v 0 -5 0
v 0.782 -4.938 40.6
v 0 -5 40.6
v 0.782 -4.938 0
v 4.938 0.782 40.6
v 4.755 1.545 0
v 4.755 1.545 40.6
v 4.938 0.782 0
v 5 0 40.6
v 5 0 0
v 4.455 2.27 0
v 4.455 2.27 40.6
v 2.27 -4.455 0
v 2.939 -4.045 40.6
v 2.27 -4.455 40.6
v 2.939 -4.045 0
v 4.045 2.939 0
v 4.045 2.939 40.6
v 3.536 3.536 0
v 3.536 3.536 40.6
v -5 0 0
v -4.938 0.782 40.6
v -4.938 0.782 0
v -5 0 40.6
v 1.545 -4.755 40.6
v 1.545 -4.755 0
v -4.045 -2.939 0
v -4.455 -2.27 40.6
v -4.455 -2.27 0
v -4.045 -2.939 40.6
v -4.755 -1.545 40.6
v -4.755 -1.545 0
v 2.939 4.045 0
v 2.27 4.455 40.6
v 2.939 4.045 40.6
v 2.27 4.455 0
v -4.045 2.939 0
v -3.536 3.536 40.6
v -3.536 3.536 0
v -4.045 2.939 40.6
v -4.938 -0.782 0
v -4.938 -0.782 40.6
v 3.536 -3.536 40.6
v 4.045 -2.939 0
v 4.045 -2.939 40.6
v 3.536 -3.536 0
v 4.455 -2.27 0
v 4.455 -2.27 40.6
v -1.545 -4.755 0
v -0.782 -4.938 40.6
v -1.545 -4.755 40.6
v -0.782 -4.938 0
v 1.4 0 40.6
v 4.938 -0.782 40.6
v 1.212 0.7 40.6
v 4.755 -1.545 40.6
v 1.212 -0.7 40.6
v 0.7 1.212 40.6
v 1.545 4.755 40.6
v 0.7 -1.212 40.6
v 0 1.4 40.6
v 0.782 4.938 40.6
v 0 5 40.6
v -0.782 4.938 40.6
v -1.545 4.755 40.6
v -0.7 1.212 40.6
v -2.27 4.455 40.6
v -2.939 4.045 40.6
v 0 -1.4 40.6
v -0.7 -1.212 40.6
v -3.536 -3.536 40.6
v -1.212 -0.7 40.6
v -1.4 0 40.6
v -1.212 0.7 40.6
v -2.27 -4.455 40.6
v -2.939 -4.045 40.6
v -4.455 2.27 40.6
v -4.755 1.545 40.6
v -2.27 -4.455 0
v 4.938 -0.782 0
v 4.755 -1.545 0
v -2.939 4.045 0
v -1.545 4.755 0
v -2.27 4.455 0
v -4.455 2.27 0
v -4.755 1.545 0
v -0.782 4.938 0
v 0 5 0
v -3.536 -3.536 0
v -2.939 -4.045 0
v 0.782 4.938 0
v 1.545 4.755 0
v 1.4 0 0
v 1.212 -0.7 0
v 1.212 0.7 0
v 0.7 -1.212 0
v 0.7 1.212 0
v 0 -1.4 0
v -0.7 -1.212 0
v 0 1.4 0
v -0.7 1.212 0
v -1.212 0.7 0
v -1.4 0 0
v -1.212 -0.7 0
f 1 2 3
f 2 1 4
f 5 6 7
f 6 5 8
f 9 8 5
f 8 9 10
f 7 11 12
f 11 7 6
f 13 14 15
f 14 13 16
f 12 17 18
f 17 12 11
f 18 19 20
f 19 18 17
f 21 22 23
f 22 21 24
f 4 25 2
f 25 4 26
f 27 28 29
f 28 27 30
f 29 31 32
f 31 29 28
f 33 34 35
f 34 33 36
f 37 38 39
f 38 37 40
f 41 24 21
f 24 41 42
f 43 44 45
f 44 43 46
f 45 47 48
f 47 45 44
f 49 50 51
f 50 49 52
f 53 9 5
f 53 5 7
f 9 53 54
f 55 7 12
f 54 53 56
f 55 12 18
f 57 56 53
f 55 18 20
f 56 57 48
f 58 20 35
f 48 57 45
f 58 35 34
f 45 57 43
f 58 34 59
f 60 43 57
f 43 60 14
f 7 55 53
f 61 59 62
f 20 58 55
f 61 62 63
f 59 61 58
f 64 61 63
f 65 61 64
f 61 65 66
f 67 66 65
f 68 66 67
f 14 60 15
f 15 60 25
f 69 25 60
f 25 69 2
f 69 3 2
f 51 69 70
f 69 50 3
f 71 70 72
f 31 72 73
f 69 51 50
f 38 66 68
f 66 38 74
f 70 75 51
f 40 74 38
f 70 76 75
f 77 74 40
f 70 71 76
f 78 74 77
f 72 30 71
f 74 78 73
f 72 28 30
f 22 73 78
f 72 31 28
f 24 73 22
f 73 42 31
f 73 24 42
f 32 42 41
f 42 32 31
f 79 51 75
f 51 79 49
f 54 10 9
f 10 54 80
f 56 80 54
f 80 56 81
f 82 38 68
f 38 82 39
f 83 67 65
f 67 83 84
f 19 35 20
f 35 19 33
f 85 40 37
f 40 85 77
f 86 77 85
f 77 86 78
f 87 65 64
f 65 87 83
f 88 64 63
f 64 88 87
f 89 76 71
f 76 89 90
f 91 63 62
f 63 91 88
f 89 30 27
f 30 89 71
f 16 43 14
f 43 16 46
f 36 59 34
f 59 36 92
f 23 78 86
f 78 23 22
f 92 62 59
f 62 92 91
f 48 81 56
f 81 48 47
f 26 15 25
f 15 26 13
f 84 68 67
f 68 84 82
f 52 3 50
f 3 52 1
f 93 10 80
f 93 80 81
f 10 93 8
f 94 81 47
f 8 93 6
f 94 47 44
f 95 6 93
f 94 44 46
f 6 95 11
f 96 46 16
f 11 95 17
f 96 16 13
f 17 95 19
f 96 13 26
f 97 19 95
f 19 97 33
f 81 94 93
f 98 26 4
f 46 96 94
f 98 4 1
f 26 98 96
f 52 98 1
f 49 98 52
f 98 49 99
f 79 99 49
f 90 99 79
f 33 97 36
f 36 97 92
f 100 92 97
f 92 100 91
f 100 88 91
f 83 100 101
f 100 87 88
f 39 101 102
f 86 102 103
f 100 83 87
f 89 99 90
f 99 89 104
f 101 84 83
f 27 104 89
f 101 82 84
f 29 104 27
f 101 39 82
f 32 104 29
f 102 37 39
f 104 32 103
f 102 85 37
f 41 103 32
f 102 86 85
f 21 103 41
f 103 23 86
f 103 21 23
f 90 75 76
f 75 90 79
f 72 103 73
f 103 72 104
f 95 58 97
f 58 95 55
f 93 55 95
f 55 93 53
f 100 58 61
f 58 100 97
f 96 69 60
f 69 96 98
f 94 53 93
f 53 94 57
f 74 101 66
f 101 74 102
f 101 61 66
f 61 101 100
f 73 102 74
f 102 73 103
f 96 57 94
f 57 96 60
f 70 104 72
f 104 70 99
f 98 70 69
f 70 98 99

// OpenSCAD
module mock_battery_AAA() {
    cylinder(d=10.2,h=42.5,$fn=40);
    cylinder(d=3.7,h=1.6+42.5,$fn=20);
}

module mock_screw_m3() {
    cylinder(d=3,h=10,$fn=20);
    cylinder(d=6,h=2.4,$fn=20);
}

module battery_AAA() {
    difference() {
        cylinder(d=10,h=42.5+1.6-3.5,$fn=40);
        cylinder(d=2.8,h=50,$fn=12);
    }
}

battery_AAA();
